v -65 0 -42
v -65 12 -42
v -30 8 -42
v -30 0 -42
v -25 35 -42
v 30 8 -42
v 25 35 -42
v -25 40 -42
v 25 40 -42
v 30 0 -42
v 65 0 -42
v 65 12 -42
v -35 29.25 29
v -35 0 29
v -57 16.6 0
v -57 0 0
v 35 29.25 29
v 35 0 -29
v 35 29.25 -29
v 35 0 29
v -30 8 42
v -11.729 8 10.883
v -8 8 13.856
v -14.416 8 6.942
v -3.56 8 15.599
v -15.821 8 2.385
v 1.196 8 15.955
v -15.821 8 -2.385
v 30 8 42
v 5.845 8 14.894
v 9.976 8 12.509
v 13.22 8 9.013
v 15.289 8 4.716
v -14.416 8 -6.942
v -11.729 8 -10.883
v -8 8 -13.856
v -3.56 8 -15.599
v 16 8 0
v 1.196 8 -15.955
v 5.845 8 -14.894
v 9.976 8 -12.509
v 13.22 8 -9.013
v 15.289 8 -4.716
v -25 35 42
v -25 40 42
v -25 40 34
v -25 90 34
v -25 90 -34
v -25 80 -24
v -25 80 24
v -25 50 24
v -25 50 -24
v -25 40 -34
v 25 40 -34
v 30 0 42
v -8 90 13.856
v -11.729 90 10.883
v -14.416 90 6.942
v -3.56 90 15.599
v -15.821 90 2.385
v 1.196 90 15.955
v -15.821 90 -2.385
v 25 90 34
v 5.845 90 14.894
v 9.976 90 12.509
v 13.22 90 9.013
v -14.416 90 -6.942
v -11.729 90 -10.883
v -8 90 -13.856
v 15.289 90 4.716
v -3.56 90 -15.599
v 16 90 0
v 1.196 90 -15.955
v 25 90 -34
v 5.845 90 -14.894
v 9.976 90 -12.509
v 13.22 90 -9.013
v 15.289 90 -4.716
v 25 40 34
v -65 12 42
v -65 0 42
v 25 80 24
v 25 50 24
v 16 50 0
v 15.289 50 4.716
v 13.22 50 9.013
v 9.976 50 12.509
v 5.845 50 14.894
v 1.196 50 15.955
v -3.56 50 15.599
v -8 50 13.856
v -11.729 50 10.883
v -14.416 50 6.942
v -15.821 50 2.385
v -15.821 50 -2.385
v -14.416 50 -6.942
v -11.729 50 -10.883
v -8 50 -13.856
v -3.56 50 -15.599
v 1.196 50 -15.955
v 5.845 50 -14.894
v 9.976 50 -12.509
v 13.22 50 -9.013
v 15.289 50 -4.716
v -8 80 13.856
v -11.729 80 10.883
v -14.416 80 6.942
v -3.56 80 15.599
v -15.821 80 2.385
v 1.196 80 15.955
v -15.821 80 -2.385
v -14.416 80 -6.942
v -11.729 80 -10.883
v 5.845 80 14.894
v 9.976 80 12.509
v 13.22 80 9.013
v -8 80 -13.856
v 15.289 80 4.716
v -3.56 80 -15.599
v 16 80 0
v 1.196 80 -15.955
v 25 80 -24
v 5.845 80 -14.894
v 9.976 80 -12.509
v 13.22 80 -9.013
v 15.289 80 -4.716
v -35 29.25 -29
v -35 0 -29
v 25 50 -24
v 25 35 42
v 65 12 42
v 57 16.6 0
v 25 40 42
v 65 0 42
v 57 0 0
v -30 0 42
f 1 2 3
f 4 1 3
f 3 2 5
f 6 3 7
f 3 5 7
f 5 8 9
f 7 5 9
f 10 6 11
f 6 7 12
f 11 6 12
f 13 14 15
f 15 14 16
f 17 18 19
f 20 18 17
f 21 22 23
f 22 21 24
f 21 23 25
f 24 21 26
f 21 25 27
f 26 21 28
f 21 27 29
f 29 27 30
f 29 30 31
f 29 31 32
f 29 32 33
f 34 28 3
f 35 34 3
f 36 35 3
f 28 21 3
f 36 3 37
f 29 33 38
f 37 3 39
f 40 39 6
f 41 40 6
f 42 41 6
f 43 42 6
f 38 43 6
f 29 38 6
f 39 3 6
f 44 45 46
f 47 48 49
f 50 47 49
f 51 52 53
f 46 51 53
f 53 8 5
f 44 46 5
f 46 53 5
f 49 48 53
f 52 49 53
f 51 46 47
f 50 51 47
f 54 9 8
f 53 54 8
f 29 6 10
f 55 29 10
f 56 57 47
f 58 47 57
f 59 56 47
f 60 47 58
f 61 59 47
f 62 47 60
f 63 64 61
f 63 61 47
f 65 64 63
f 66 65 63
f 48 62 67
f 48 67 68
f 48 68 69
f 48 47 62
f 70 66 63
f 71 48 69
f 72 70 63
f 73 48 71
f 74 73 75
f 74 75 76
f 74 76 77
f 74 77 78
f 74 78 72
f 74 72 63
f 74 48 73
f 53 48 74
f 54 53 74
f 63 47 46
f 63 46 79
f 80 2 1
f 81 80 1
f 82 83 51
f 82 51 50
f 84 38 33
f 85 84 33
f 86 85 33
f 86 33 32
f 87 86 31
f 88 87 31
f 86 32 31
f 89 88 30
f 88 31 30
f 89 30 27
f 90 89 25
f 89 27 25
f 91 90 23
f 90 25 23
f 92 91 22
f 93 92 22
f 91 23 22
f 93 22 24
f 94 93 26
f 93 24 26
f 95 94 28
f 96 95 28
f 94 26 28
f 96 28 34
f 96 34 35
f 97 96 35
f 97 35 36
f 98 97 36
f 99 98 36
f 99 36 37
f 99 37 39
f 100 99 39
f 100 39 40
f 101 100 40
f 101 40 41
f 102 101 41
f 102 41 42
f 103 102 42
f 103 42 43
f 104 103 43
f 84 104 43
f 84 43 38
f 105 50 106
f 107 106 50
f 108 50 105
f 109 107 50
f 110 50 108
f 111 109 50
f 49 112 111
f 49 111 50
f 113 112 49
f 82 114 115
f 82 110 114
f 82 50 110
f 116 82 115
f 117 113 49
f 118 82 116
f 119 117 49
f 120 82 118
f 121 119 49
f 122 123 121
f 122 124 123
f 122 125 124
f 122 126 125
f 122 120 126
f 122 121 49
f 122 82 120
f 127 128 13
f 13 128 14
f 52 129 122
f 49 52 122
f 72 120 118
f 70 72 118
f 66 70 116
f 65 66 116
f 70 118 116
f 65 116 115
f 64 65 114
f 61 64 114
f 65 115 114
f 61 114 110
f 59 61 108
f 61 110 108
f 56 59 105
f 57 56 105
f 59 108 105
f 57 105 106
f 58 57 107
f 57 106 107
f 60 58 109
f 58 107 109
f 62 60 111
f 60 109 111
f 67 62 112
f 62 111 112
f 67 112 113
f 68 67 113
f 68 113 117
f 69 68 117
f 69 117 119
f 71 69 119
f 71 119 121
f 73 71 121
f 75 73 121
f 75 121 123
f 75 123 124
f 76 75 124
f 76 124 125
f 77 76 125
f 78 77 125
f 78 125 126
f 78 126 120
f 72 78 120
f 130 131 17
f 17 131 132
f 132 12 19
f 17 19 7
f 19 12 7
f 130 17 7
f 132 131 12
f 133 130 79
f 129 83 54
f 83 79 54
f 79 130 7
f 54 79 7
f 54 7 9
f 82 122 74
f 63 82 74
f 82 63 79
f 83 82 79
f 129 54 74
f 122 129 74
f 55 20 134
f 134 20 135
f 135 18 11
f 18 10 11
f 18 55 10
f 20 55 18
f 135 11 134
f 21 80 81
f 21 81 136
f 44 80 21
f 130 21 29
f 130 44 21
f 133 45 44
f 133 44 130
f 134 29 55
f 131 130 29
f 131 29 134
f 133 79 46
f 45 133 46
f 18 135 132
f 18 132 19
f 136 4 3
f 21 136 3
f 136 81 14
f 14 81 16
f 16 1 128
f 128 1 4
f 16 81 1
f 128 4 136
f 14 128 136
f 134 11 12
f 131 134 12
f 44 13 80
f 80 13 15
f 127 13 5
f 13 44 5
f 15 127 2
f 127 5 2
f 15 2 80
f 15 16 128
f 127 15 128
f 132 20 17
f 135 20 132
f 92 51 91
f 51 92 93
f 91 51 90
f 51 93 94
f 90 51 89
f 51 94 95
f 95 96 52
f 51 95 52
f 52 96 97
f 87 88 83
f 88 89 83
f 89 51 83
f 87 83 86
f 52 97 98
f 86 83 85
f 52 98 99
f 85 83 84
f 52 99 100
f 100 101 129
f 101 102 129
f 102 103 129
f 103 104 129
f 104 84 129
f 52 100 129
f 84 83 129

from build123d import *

# Parameters (mm, degrees)
BOSS_EXTRUDE1_DEPTH      = 42
BOSS_EXTRUDE1_DEPTH_BACK = 42
BOSS_EXTRUDE2_DEPTH      = 34
BOSS_EXTRUDE2_DEPTH_BACK = 34
SKETCH1_3_W              = 50
SKETCH1_3_H              = 50
SKETCH2_W                = 48
SKETCH2_H                = 30
CUT_EXTRUDE1_DEPTH       = 135.029847422
SKETCH3_R                = 16
CUT_EXTRUDE2_DEPTH       = 119.697093477


with BuildPart() as part:
    # Sketch1 → Boss-Extrude1 (new, two sides: drawn at the far end of the back side and taken through both)
    with BuildSketch(Plane.XY.offset(-BOSS_EXTRUDE1_DEPTH_BACK)):
        Polygon((-30, 0), (-30, 8), (30, 8), (30, 0), (65, 0), (65, 12), (25, 35), (25, 40), (-25, 40), (-25, 35), (-65, 12), (-65, 0), align=None)
    extrude(amount=BOSS_EXTRUDE1_DEPTH + BOSS_EXTRUDE1_DEPTH_BACK)

    # Sketch1<3> → Boss-Extrude2 (add, two sides: drawn at the far end of the back side and taken through both)
    with BuildSketch(Plane.XY.offset(-BOSS_EXTRUDE2_DEPTH_BACK)):
        with Locations((0, 65)):
            Rectangle(SKETCH1_3_W, SKETCH1_3_H)
    extrude(amount=BOSS_EXTRUDE2_DEPTH + BOSS_EXTRUDE2_DEPTH_BACK)

    # Sketch2 → Cut-Extrude1 (cut, through all)
    with BuildSketch(Plane(origin=(25, 0, 0), x_dir=(0, 0, -1), z_dir=(1, 0, 0))):
        with Locations((0, 65)):
            Rectangle(SKETCH2_W, SKETCH2_H)
    extrude(amount=-CUT_EXTRUDE1_DEPTH, mode=Mode.SUBTRACT)

    # Sketch3 → Cut-Extrude2 (cut, through all)
    with BuildSketch(Plane.XZ):
        Circle(SKETCH3_R)
        Polygon((-35, 29), (-57, 0), (-35, -29), align=None)
        Polygon((35, -29), (35, 29), (57, 0), align=None)
    extrude(amount=-CUT_EXTRUDE2_DEPTH, mode=Mode.SUBTRACT)


solid = part.part
